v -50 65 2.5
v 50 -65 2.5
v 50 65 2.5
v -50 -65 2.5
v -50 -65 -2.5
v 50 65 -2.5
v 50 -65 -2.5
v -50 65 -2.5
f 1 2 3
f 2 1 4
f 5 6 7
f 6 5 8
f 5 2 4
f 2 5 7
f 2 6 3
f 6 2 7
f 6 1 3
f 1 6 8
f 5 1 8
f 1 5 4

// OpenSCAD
// Generated by SolidPython 1.1.3 on 2022-11-23 19:35:01


cube(center = true, size = [100, 130.0000000000, 5]);
/***********************************************
*********      SolidPython code:      **********
************************************************
 
import solid
import pudb
from solid.utils import *
import viewscad
import subprocess
import os
import os.path as osp
import math
r = viewscad.Renderer(width=800, height=800)
def debug(model,f_name,path="/home/ts/code/projects/mfd/designs/debug"):
    solid.scad_render_to_file(model,osp.join(path,f_name)+".scad")
#generate position list of wells using offset from center
wells_pos_from_center_4 = lambda offset: [[-offset,offset],
                                        [offset, offset],
                                        [-offset, -offset],
                                        [offset, -offset]]
#wells_pos_from_center_2 = lambda offset: [[0,offset],
#                                        [0, -offset]]
wells_pos_from_center_2 = lambda offset: [[offset,0],
                                        [-offset,0]]

def wells_top_bottom(radius,height=None, positions = None, dxf = False):
    if positions is None:
        offset = radius+radius/2.0
        positions = wells_pos_from_center_2(offset)
    if dxf or (height is None):
        height = 0
    wells = []
    for position in positions:
        #make circle if making dxf
        if dxf:
            well_shape = solid.circle(r=radius, segments=64)
            well_shape = solid.translate([position[0],position[1]])(well_shape)
        #if stl make cylinder
        else:
            well_shape = solid.cylinder(r=radius, h=height, segments=64, center = True)
            well_shape = solid.translate([position[0],position[1],height/2.0])(well_shape)
        wells.append(well_shape)
    return  union()(*wells)

#place wells in four corners 
def four_corner(radius,height=None, positions = None, dxf = False):
    #if well pos not specified set
    #to equally spaced by half radius
    if positions is None:
        offset = radius+radius/2.0
        positions = wells_pos_from_center_4(offset)
    if dxf or (height is None):
        height = 0
    #make wells at positions with specified radius and height
    wells = []
    for position in positions:
        #make circle if making dxf
        if dxf:
            well_shape = solid.circle(r=radius, segments=64)
            well_shape = solid.translate([position[0],position[1]])(well_shape)
        #if stl make cylinder
        else:
            well_shape = solid.cylinder(r=radius, h=height, segments=64, center = True)
            well_shape = solid.translate([position[0],position[1],height/2.0])(well_shape)
        wells.append(well_shape)
    return  union()(*wells)

#generate channels 
def make_channels(length,width,height=0,num_chans=1,max_chans=None,spacing=None, dxf = False,
                  rotate_channels=False):
    if dxf or (height is None):
        height = 0
    #if channel gap not defined, is equal to
    if spacing is None: spacing = width
    #calculate number of channels if fitting max num within given width
    if not max_chans is None:
        import math
        num_chans = math.floor((max_chans-spacing)/(width+spacing))
    #get total width of channel section  
    total_width = (width*num_chans)+(spacing*(num_chans-1))

    #make template channel
    #if rotate_channels: width, length = length, width
    if dxf:
        channel_t = solid.square([length,width],center = True)
    else:
        channel_t = solid.cube([length,width,height], center = True)

    #if number channels is even, offset the first channel to center its gap
    if num_chans % 2 == 0: centering = -(width/2.0+spacing/2.0)
    else: centering = 0
    #move template channel up to align bottom at z = 0 
    #and offset center if necessary
    if dxf:
        channel_t = solid.translate([0,centering])(channel_t)
    else:
        channel_t = solid.translate([0,centering,height/2.0])(channel_t)

    #if rotate_channels: length,width = width,length
    #start making the channels
    channels = []
    for i in range(num_chans):
        #if i=0 there is no translation
        #if i=1, we make the first channel adjacent to second
        direction = i

        #if i>=1, we add channels alternating left and right
        if i >= 1:
            direction = -(i/2.0)
            if i % 2 == 1: direction = (-direction)+0.5
                
        #make channel at right position and add it to channel list
        translation_coords = [0,direction*(width+spacing)]
        #if rotate_channels: translation_coords = [direction*(width+spacing),0]
        if dxf:
            channel = solid.translate(translation_coords)(channel_t)
        else:
            channel = solid.translate([*translation_coords,0])(channel_t)
        channels.append(channel)
    
    #group all channels as one object
    channels = union()(*channels)
    #compute the x,y,z dimensions in order to pass as arguments 
    #for construction of other parts of device (such as the chambers)
    measurements = {'x':(length/2.0,-length/2.0),
                    'y':(total_width/2.0,-total_width/2.0)}
    if not dxf:
        measurements['z'] = (height,0)
    if rotate_channels:
        channels = solid.rotate(90)(channels)
        measurements['x'],measurements['y']=measurements['y'],measurements['x']
    return channels,measurements

def make_chambers(msrs,height=None,extra=0,len_until=None,width=None, dxf = False):
    #computes x,y,z length
    total = lambda x : abs(x[0]) + abs(x[1])
    
    #if specific height if specified
    #otherwise use same height as channels
    if dxf:
        pass
    elif not height is None:
        msrs['z'] = (height,0)
    else:
        msrs['z'] = (0,0)
        
    #make copy of measurements from channels to modify chamber dimensions 
    #and add length to chambers as specified
    chamber_dims = msrs.copy()
    #calculate length of chamber to reach specified offset
    if not len_until is None:
        chamber_len = len_until-(msrs['x'][0])
    #or add specified length to channel length (if not specified, adds 0)
    else:
        chamber_len = msrs['x'][0]+extra
    #set the chamber length based 
    chamber_dims['x'] = (chamber_len/2.0,-(chamber_len/2.0))
    #compute final dimensions of chamber
    if not width is None:
        chamber_dims['y'] = (width/2.0,-width/2.0)
    chamber_dims = [total(size) for size in chamber_dims.values()]
        
    #calculate chamber translation offset to place adjacent to channels
    chamber_trslt = msrs['x'][0]+(chamber_len/2.0)
    #compute chamber translation coordinates to align with channels
    #x = 1 moves chamber above channels
    #x = -1 moves chamber below channels
    if dxf:
        trslt = lambda x : [x*(chamber_trslt),0]
    else:
        trslt = lambda x : [x*(chamber_trslt),0,msrs['z'][0]/2.0]
    
    #function to make chamber at top or at bottom 
    if dxf:
        move = lambda x : solid.translate(trslt(x))(solid.square(chamber_dims, center = True) )
    else:
        move = lambda x : solid.translate(trslt(x))(solid.cube(chamber_dims,center = True))
    #make top and bottom chambers and return them as grouped
    top = move(1)
    bottom = move(-1)
    #chambers=solid.rotate(90)(solid.union()(top,bottom))
    chambers=(solid.union()(top,bottom))

    return chambers

#create alignment features 
def alignment_features(unit,dims,grid_size, mask_size = None, alignment = "hollow", units_from_center = (2.5,2.5), corner_len=None):
    width = grid_size[0]*dims[0]
    length = grid_size[1]*dims[1]
    if mask_size is None and corner_len is None:
        corner_len = (dims[0] + dims[1]) /2 / 8
    corner = lambda thickness_div : solid.union()( solid.square([corner_len,corner_len/thickness_div],center=False), solid.square([corner_len/thickness_div,corner_len],center=False) )
    
    def make_full(thickness_div):
        thickness = corner_len/thickness_div
        tr = solid.translate([0, 0, 0 ])(solid.rotate(180)(corner(thickness_div)))
        tr = solid.translate([thickness/2,thickness/2,0])(tr)
        bl = solid.translate([0, 0, 0 ])(solid.rotate(0)(corner(thickness_div)))
        bl = solid.translate([-thickness/2,-thickness/2,0])(bl)
        return solid.union()(tr,bl)
    
    def make_hollow(thickness_div):
        thickness = corner_len/(thickness_div/2)
        inner = make_full(thickness_div)
        outer = make_full(thickness_div/2)
        hollow = outer - inner 
        return hollow
    
    center = (width /2 , length/2)
    mask_pos = lambda x,y : (center[0] + x*(float(units_from_center[0])*dims[0]), center[1] + y*(float(units_from_center[1])*dims[1]))
    positions = []
    positions.append(mask_pos(1,0))
    positions.append(mask_pos(0,1))
    positions.append(mask_pos(-1,0))
    positions.append(mask_pos(0,-1))
    make_mask = lambda mtype : make_hollow(8) if mtype == "hollow" else make_full(8)
    masks = [ solid.translate([*position,0])(make_mask(alignment)) for position in positions]
    
    solid.scad_render_to_file(solid.union()(*masks),"./designs/open_chamber/masks.scad")
    #return unit - solid.union()(*masks)
    return solid.union()(*masks,unit)

def create_outline(thickness, array, dims, grid_size,):
    width = grid_size[0]*dims[0] + thickness *2
    length = grid_size[1]*dims[1] + thickness *2
    outer = solid.translate([-thickness, -thickness,0])(solid.square([width, length]))
    return outer-array

def create_wall(wall_thickness, outline_thickness, dims, grid_size, wall_height = 2000, dxf = False):
    inner_width = grid_size[0]*dims[0] + outline_thickness *2
    inner_length = grid_size[1]*dims[1] + outline_thickness *2
    outer_width = inner_width + wall_thickness * 2
    outer_length = inner_length + wall_thickness * 2
    outer_pos_x = -outline_thickness-wall_thickness
    outer_pos_y = -outline_thickness-wall_thickness
    inner_pos_x = -outline_thickness
    inner_pos_y = -outline_thickness
    if dxf:
        inner_wall = solid.translate([inner_pos_x,
                                      inner_pos_y,
                                      0])(solid.square([inner_width, inner_length]))
        outer_wall = solid.translate([outer_pos_x,
                                      outer_pos_y,
                                      0])(solid.square([outer_width, outer_length]))

        return outer_wall-inner_wall
    else:
        inner_wall = solid.translate([inner_pos_x,
                                      inner_pos_y,
                                      0])(solid.cube([inner_width, inner_length,wall_height]))
        outer_wall = solid.translate([outer_pos_x,
                                      outer_pos_y,
                                      0])(solid.cube([outer_width, outer_length,wall_height]))

        return outer_wall-inner_wall, {'wall_height': wall_height,
                                       'wall_thickness': wall_thickness,
                                       'inner_width':inner_width,
                                       'inner_length': inner_length,
                                       'outer_width': outer_width,
                                       'outer_length': outer_length,
                                       'outer_pos_x' : outer_pos_x,
                                       'outer_pos_y' : outer_pos_y,
                                       'inner_pos_x' : inner_pos_x,
                                       'inner_pos_y' : inner_pos_y}

def create_thicker_wall(wall_thickness, outer_wall_offset, wall_dims, dims, grid_size, height_start = .2, height_end=2, dxf = False):
    addon_wall,thicker_wall_dims = create_wall(wall_thickness, outer_wall_offset, dims, grid_size, wall_height=height_end-height_start, dxf = False)
    addon_wall = solid.translate([0,0,height_start])(addon_wall)

    thicker_wall_dims['wall_height'] = height_end
    thicker_wall_dims['wall_thickness'] = wall_dims['wall_thickness'] + wall_thickness
    return addon_wall, thicker_wall_dims
 
def add_lock_to_wall(wall,wall_dims,y_offset = 0,cut_ratio=0.7,L_length=3, gap_ratio=0.05, axis="x",width_ratio=1/2):
    # Makes L shape
    def make_L(max_length,length_thickness,max_width,width_thickness,height,y_offset):
        length = solid.cube([max_length,length_thickness,height])
        width = solid.cube([width_thickness,max_width,height])
        width = solid.translate([max_length-(width_thickness),0,0])(width)
        L = solid.union()(width,length)
        debug(L,"L")
        if axis == "x":
            L = solid.rotate(-90)(L)
            L = solid.translate([0,max_length,0])(L)
        else:
            L = solid.rotate(-180)(L)
            L = solid.translate([max_length,max_width,0])(L)
        return solid.translate([0,0,y_offset])(L)
    
    lock_length = L_length
    lock_width = wall_dims['wall_thickness']*width_ratio
    lock_length_thickness = lock_width/2
    lock_width_thickness = lock_width/2
    L_lock = make_L(lock_length,lock_length_thickness,lock_width,lock_width_thickness, wall_dims['wall_height']-y_offset, y_offset)
    
    margin_space = lock_length - lock_length*(1-gap_ratio)
    key_length = lock_length-margin_space
    key_length_thickness = lock_length_thickness-(margin_space*2)
    key_width = lock_width-(margin_space*2)
    key_width_thickness = lock_width_thickness-(margin_space*2)
    L_key = make_L(key_length,key_length_thickness,key_width,key_width_thickness, wall_dims['wall_height']-y_offset, y_offset)
    L_key = solid.translate([margin_space,margin_space,0])(L_key)
    L = solid.union()(L_lock,L_key)
    debug(L,"L")
    
    #Make cube to be used as negative to split frame in a half
    #Can choose if making left or right negative, specify ratio of split
    def make_negative(right,cut_ratio):
        if axis == "x":
            if right:
                length = wall_dims['outer_length']*(1-cut_ratio)
                pos_x = wall_dims['outer_pos_x']+(wall_dims['outer_length']*cut_ratio)
            else:
                length = wall_dims['outer_length']*(cut_ratio)
                pos_x = wall_dims['outer_pos_x'] 
            negative = solid.cube([wall_dims['outer_width'],length, wall_dims['wall_height']])
            negative = solid.translate([wall_dims['outer_pos_y'],pos_x,0])(negative)
        else:
            if right:
                length = wall_dims['outer_width']*(1-cut_ratio)
                pos_x = wall_dims['outer_pos_y']+(wall_dims['outer_width']*cut_ratio)
            else:
                length = wall_dims['outer_width']*(cut_ratio)
                pos_x = wall_dims['outer_pos_y'] 
            negative = solid.cube([length,wall_dims['outer_length'], wall_dims['wall_height']])
            negative = solid.translate([pos_x,wall_dims['outer_pos_x'],0])(negative)
        return negative, pos_x, length 
                      
    #Make negatives
    negative_right, right_half_pos_x, right_half_length = make_negative(True,cut_ratio)
    negative_left, left_half_pos_x, right_half_length = make_negative(False,cut_ratio)
    #Make halves
    left_half = solid.difference()(wall,negative_right)
    right_half = solid.difference()(wall,negative_left)
    def place_L(L, L_length,L_width):
        #Place L on top wall       
        offset_to_center = (wall_dims['wall_thickness']-L_width)/2
        if axis == "x":
            y_pos_top = (wall_dims['outer_pos_y'] +
                    wall_dims['outer_width'] - 
                    L_width - offset_to_center)
            top_L = solid.translate([y_pos_top,
                                     right_half_pos_x-(L_length),
                                     0])(L)
            #Place L on bottom wall       
            y_pos_bottom = wall_dims['outer_pos_y']+offset_to_center
            bottom_L = solid.translate([y_pos_bottom,
                                        right_half_pos_x-L_length,
                                        0])(L)
        else:
            y_pos_top = (wall_dims['outer_pos_x'] +
                    wall_dims['outer_length'] -
                    (L_width+offset_to_center))
            top_L = solid.translate([right_half_pos_x-L_length,
                                     y_pos_top,
                                     0])(L)
            #Place L on bottom wall       
            y_pos_bottom = wall_dims['outer_pos_y']+offset_to_center
            bottom_L = solid.translate([right_half_pos_x-L_length,
                                        y_pos_bottom,
                                        0])(L)
        return bottom_L, top_L
    #Make complimentary L pieces through union and differences
    #Make Lock
    bottom_L_lock, top_L_lock = place_L(L_lock,L_length,lock_width)
    left_half = solid.difference()(left_half,bottom_L_lock)
    left_half = solid.difference()(left_half,top_L_lock)
    #Make Key
    bottom_L_key, top_L_key = place_L(L_key,L_length,lock_width)
    right_half = solid.union()(right_half,bottom_L_key)
    right_half = solid.union()(right_half,top_L_key)
    return left_half, right_half


#build a row x col grid of containment units
def make_unit_array(unit,dims,grid_size, dxf = False, alignment = None, mask_size = None,
                    units_from_center = None,alignment_offset=None, alignment_mark_size=1):
    units = []
    for col in range(grid_size[1]):
        for row in range(grid_size[0]):
            if dxf:
                units.append(solid.translate([row*dims[0],col*dims[1]])(unit))
            else:
                units.append(solid.translate([row*dims[0],col*dims[1],dims[2]/2.0])(unit))
    array = solid.union()(*units)
    if (not alignment is None) and dxf:
        if not alignment_offset is None:
            array = solid.translate([alignment_offset[0],alignment_offset[1]])(array)
        array = alignment_features(array,dims, grid_size, alignment = alignment, mask_size = None, units_from_center = units_from_center,corner_len=alignment_mark_size)
        if not alignment_offset is None:
            array = solid.translate([-alignment_offset[0],-alignment_offset[1]])(array)
    return array


def make_taylor(wells_pos = wells_pos_from_center_4(2.25), well_rad = 1.5 ,
                well_height = 2, chan_w = 0.01, chan_l = 1, chan_h = 0.010 ,
                chan_gap = 0.040, max_chans = None,num_chans=100, chamber_height  = 0.100,
                columns = 1, rows = 1, chamber_len_until=2.25, add_channels = True, add_wells = True, 
                add_chambers = True, save_path = "./", alignment = None, units_from_center = 2,
                mask_size = None, render_stl = False, outline_thickness = 0.050, dxf = True,
                wall_height = 15, wall_thickness = 0.95, casing_x=9, casing_y=9, casing_z=0,rotate_units=0):

    dims = [casing_x, casing_y, casing_z]
    wells = four_corner(well_rad,well_height, dxf = dxf, positions = wells_pos)
    debug(wells,"wells")
    channels, msrs = make_channels(chan_l,chan_w,chan_h,dxf=dxf, spacing = chan_gap, max_chans=max_chans,num_chans=num_chans)
    debug(channels,"channels")
    chambers = make_chambers(msrs,dxf = dxf, height=chamber_height,len_until=chamber_len_until)
    debug(chambers,"chambers")

    #add together and render
    device_parts = []
    if add_channels:
        device_parts.append(channels)
    if add_wells:
        device_parts.append(wells)
    if add_chambers:
        device_parts.append(chambers)
    device=union()(*device_parts)
    device = rotate(rotate_units)(device)

    device=solid.translate([dims[0]/2.0,dims[1]/2.0,0])(device)
    channels = rotate(rotate_units)(channels)
    channels=solid.translate([dims[0]/2,dims[1]/2,0])(channels)
    chambers_wells = union()(wells,chambers)
    chambers_wells = rotate(rotate_units)(chambers_wells)
    chambers_wells=solid.translate([dims[0]/2,dims[1]/2,0])(chambers_wells)

    file_name = str(rows)+'x'+str(columns)+'_units_'
    grid_size = [rows,columns]

    if alignment:
        alignment="full"
    device = make_unit_array(device,dims,grid_size, dxf=dxf, alignment = alignment,
                                 units_from_center = units_from_center)
    channels = make_unit_array(channels,dims,grid_size, dxf=dxf, alignment = alignment,
                                 units_from_center = units_from_center)
    if alignment=="full":
        alignment="hollow"

    chambers_wells = make_unit_array(chambers_wells,dims,grid_size, dxf=dxf, alignment = alignment,
                                 units_from_center =units_from_center)

    def save_model(model,prefix):
        model_fname = os.path.abspath(save_path+prefix+"_"+file_name+".scad")
        solid.scad_render_to_file(model,model_fname)
        return model_fname

    wells_fname = save_model(wells,"wells")
    channels_fname = save_model(channels,"channels")
    device_fname = save_model(device,"device")
    chambers_wells_fname = save_model(chambers_wells,"chambers_wells")
    return (chambers_wells,chambers_wells_fname), (channels,channels_fname), (device,device_fname)

def make_device(design='open',rows=8,columns=6,wells_pos = 4.5, well_rad=3.2,well_height=0.1,
                chan_l=1,chan_w=0.01,chan_h=0.01,chan_gap=0.015,num_chans=101,dxf=True,save_path="./designs/open_chamber/",
                casing_x=9.0,casing_y=18.0,casing_z=0,rotate_units=90,units_from_center=(3,1),chamber_len_until=4.5,
                chamber_width=None,alignment=True, add_wells=True, add_channels=True,add_chambers=True):

    dims = [casing_x, casing_y, casing_z]
    if design == "open":
        wells_pos=wells_pos_from_center_2(wells_pos)
        wells = wells_top_bottom(well_rad,height=well_height, dxf = dxf, positions = wells_pos)
    elif design == "closed":
        wells_pos=wells_pos_from_center_4(wells_pos)
        wells = four_corner(well_rad,well_height, dxf = dxf, positions = wells_pos)
    else:
        print(design+" is not a valid design.\n Choose valid design: 'open' or 'closed'")
        exit()
    wells = rotate(rotate_units)(wells)
    wells=solid.translate([dims[0]/2,dims[1]/2,0])(wells)



    channels, msrs = make_channels(chan_l,chan_w,chan_h,dxf=dxf, spacing = chan_gap, num_chans=num_chans,rotate_channels=False)
    channels = rotate(rotate_units)(channels)
    channels=solid.translate([dims[0]/2,dims[1]/2,0])(channels)

    chambers=make_chambers(msrs,height=None,extra=0,len_until=chamber_len_until, width=chamber_width,dxf = dxf)
    chambers = rotate(rotate_units)(chambers)
    chambers=solid.translate([dims[0]/2,dims[1]/2,0])(chambers)

    device_parts = []
    if add_channels:
        device_parts.append(channels)
    if add_wells:
        device_parts.append(wells)
    if add_chambers:
        device_parts.append(chambers)
    device = union()(*device_parts)
    #device = rotate(rotate_units)(device)
    #device=solid.translate([dims[0]/2.0,dims[1]/2.0,0])(device)

    chambers_wells = []
    if add_chambers:
        chambers_wells.append(chambers)
    if add_wells:
        chambers_wells.append(wells)
    chambers_wells = union()(*chambers_wells)
    #chambers_wells = union()(wells,chambers)
    #chambers_wells = rotate(rotate_units)(chambers_wells)
    #chambers_wells=solid.translate([dims[0]/2,dims[1]/2,0])(chambers_wells)

    file_name = str(rows)+'x'+str(columns)+'_units_'

    grid_size = [rows,columns]
    if alignment:
        alignment="full"
    device = make_unit_array(device,dims,grid_size, dxf=dxf, alignment = alignment,
                                 units_from_center = units_from_center)
    channels = make_unit_array(channels,dims,grid_size, dxf=dxf, alignment = alignment,
                                 units_from_center = units_from_center)
    if alignment=="full":
        alignment="hollow"

    chambers_wells = make_unit_array(chambers_wells,dims,grid_size, dxf=dxf, alignment = alignment,
                                 units_from_center =units_from_center)

    def save_model(model,prefix):
        model_fname = os.path.abspath(save_path+prefix+"_"+file_name+".scad")
        solid.scad_render_to_file(model,model_fname)
        return model_fname

    wells_fname = save_model(wells,"wells")
    channels_fname = save_model(channels,"channels")
    device_fname = save_model(device,"device")
    chambers_wells_fname = save_model(chambers_wells,"chambers_wells")
    return (chambers_wells,chambers_wells_fname), (channels,channels_fname), (device,device_fname)


def make_open_chamber(rows=8,columns=6,wells_pos = wells_pos_from_center_2(4.5), well_rad=3.2,well_height=0.1,
                      chan_l=1,chan_w=0.01,chan_h=0.01,chan_gap=0.015,num_chans=101,dxf=True,save_path="./designs/open_chamber/",
                      casing_x=9.0,casing_y=18.0,casing_z=0,rotate_units=90,units_from_center=(3,1),chamber_len_until=4.5,
                      chamber_width=None,alignment=True, add_wells=True, add_channels=True,add_chambers=True):

    dims = [casing_x, casing_y, casing_z]
    wells = wells_top_bottom(well_rad,height=well_height, dxf = dxf, positions = wells_pos)
    channels, msrs = make_channels(chan_l,chan_w,chan_h,dxf=dxf, spacing = chan_gap, num_chans=num_chans,rotate_channels=False)
    chambers=make_chambers(msrs,height=None,extra=0,len_until=chamber_len_until, width=chamber_width,dxf = dxf)
    debug(chambers,"chambers")
    device_parts = []
    if add_channels:
        device_parts.append(channels)
    if add_wells:
        device_parts.append(wells)
    if add_chambers:
        device_parts.append(chambers)
    device = union()(*device_parts)
    device = rotate(rotate_units)(device)
    device=solid.translate([dims[0]/2.0,dims[1]/2.0,0])(device)
    channels = rotate(rotate_units)(channels)
    channels=solid.translate([dims[0]/2,dims[1]/2,0])(channels)
    chambers_wells = union()(wells,chambers)
    chambers_wells = rotate(rotate_units)(chambers_wells)
    chambers_wells=solid.translate([dims[0]/2,dims[1]/2,0])(chambers_wells)

    file_name = str(rows)+'x'+str(columns)+'_units_'

    grid_size = [rows,columns]
    if alignment:
        alignment="full"
    device = make_unit_array(device,dims,grid_size, dxf=dxf, alignment = alignment,
                                 units_from_center = units_from_center)
    channels = make_unit_array(channels,dims,grid_size, dxf=dxf, alignment = alignment,
                                 units_from_center = units_from_center)
    if alignment=="full":
        alignment="hollow"

    chambers_wells = make_unit_array(chambers_wells,dims,grid_size, dxf=dxf, alignment = alignment,
                                 units_from_center =units_from_center)

    def save_model(model,prefix):
        model_fname = os.path.abspath(save_path+prefix+"_"+file_name+".scad")
        solid.scad_render_to_file(model,model_fname)
        return model_fname

    wells_fname = save_model(wells,"wells")
    channels_fname = save_model(channels,"channels")
    device_fname = save_model(device,"device")
    chambers_wells_fname = save_model(chambers_wells,"chambers_wells")
    return (chambers_wells,chambers_wells_fname), (channels,channels_fname), (device,device_fname)

def to_dxf(scad_path):
    dxf_path = scad_path.replace(".scad",".dxf")
    subprocess.call(["openscad", "-o", dxf_path, scad_path])
    import ezdxf
    temp_dxf = ezdxf.readfile(dxf_path)
    temp_dxf.saveas(dxf_path)

#def make_walls(diameter,thickness,grid_size,dims,height=20,segments=256,make_inner=True):
#    wafer_wall_out = solid.cylinder(r=diameter/2,h=height, segments=segments)
#    wafer_wall_in = solid.cylinder(r=(diameter/2-thickness),h=height, segments=segments)
#    wafer_wall = solid.difference()(wafer_wall_out,wafer_wall_in)
#    wafer_wall = solid.translate([grid_size[1]*dims[1]/2.0,grid_size[0]*dims[0]/2.0])(wafer_wall)
#
#    vertical_wall_length = grid_size[1]*dims[1]
#    horizontal_wall_length = grid_size[0]*dims[0]
#    vertical_wall = solid.cube([vertical_wall_length,thickness,height],center = True)
#    vertical_wall = solid.translate([vertical_wall_length/2,0,height/2])(vertical_wall)
#    horizontal_wall = solid.cube([thickness,horizontal_wall_length,height],center = True)
#    horizontal_wall = solid.translate([0,vertical_wall_length/2,height/2])(horizontal_wall)
#    walls = []
#    walls.append(horizontal_wall)
#    walls.append(vertical_wall)
#    for col in range(grid_size[1]):
#        if col == grid_size[1]-1: 
#            walls.append(solid.translate([0,(col+1)*dims[1]])(vertical_wall))
#        elif col > 0 and col < grid_size[1]-1 and make_inner==True:
#            walls.append(solid.translate([0,(col+1)*dims[1]])(vertical_wall))
#    for row in range(grid_size[0]):
#        if row == grid_size[0]-1: 
#            walls.append(solid.translate([(row+1)*dims[0],0])(horizontal_wall))
#        elif row > 0 and row < grid_size[0]-1 and make_inner==True:
#            walls.append(solid.translate([(row+1)*dims[0],0])(horizontal_wall))
#    walls = union()(*walls)
#    wafer_walls = union()(walls,wafer_wall)
#    return walls,wafer_wall,wafer_walls

def make_walls(diameter,thickness,grid_size,dims,height=20,segments=256,make_inner=True,padx=0,pady=0):
    wafer_wall_out = solid.cylinder(r=diameter/2,h=height, segments=segments)
    wafer_wall_in = solid.cylinder(r=(diameter/2-thickness),h=height, segments=segments)
    wafer_wall = solid.difference()(wafer_wall_out,wafer_wall_in)
    wafer_wall = solid.translate([grid_size[1]*dims[1]/2.0,grid_size[0]*dims[0]/2.0])(wafer_wall)

    vertical_wall_length = grid_size[0]*dims[0]+padx
    horizontal_wall_length = grid_size[1]*dims[1]+pady
    vertical_wall = solid.cube([vertical_wall_length,thickness,height],center = True)
    vertical_wall = solid.translate([vertical_wall_length/2-pady/2,-padx/2,height/2])(vertical_wall)
    horizontal_wall = solid.cube([thickness,horizontal_wall_length,height],center = True)
    horizontal_wall = solid.translate([-pady/2,horizontal_wall_length/2-padx/2,height/2])(horizontal_wall)
    walls = []
    walls.append(horizontal_wall)
    walls.append(vertical_wall)
    for col in range(grid_size[1]):
        if col == grid_size[1]-1: 
            walls.append(solid.translate([0,(col+1)*dims[1]+pady])(vertical_wall))
        elif col > 0 and col < grid_size[1]-1 and make_inner==True:
            walls.append(solid.translate([0,(col+1)*dims[1]])(vertical_wall))
    for row in range(grid_size[0]):
        if row == grid_size[0]-1: 
            walls.append(solid.translate([(row+1)*dims[0]+padx,0])(horizontal_wall))
        elif row > 0 and row < grid_size[0]-1 and make_inner==True:
            walls.append(solid.translate([(row+1)*dims[0],0])(horizontal_wall))
    walls = union()(*walls)
    wafer_walls = union()(walls,wafer_wall)
    return walls,wafer_wall,wafer_walls

def save_model(model,base_path,base_name,dxf=True):
    if not os.path.exists(base_path):
        os.makedirs(base_path)
    dxf_path=osp.join(base_path,base_name+".scad")
    solid.scad_render_to_file(model,osp.join(dxf_path))
    if dxf:
        to_dxf(dxf_path)

def make_wafer(diameter,flat_len,thickness):
    wafer = solid.cylinder(r1=diameter/2,r2=diameter/2,h=thickness,segments=512,)()
    x_start_flat=(flat_len/2)
    y_start_flat = math.sqrt(((diameter/2)**2) - (x_start_flat**2) )
    height_delete_flat=diameter/2-y_start_flat
    flat_delete = solid.cube([flat_len,height_delete_flat,thickness],center=False)()
    flat_delete = solid.translate([-flat_len/2,y_start_flat,0])(flat_delete)
    wafer = solid.difference()(wafer,flat_delete)
    wafer = solid.rotate(90)(wafer)
    return wafer

def add_wafer_to_mask(wafer_size,flat_len,mask,grid_size,dims,wafer_line_thickness=0.1,outer_mask_thickness=5,alignment_offset=None):
    def make_wafer_mask(wafer_size,flat_len):
        wafer_mask = make_wafer(wafer_size,flat_len,1)
        wafer_mask = solid.projection()(wafer_mask)
        wafer_mask = solid.translate([grid_size[0]*dims[0]/2.0,grid_size[1]*dims[1]/2.0])(wafer_mask)
        if not alignment_offset is None:
            wafer_mask = solid.translate([-alignment_offset[0],-alignment_offset[1]])(wafer_mask)
        return wafer_mask

    inner_wafer_line_mask = make_wafer_mask(wafer_size-wafer_line_thickness/2,flat_len)
    outer_wafer_line_mask = make_wafer_mask(wafer_size+wafer_line_thickness/2,flat_len)
    outer_wafer_mask = make_wafer_mask(wafer_size+outer_mask_thickness,flat_len)
    outer_wafer_mask = solid.difference()(outer_wafer_mask,outer_wafer_line_mask)
    wafer_mask = solid.union()(outer_wafer_mask,inner_wafer_line_mask)

    return solid.difference()(wafer_mask,mask)

def make_posts(post_shape,post_height):
    posts = solid.linear_extrude(height=post_height)(post_shape)
    return posts

def make_wafer_empty(diameter,flat_len,thickness,margin,notch_len=20,notch_height=5,oversize=1.01):
    diameter*=oversize
    flat_len*=oversize
    wafer = make_wafer(diameter,flat_len,thickness)
    holder = solid.cylinder(r1=diameter/2+margin,r2=diameter/2+margin,h=thickness,segments=512)()
    holder = solid.difference()(holder,wafer)

    x_start_flat=(flat_len/2)
    y_start_flat = math.sqrt(((diameter/2)**2) - (x_start_flat**2) )
    height_delete_flat=diameter/2-y_start_flat
    notch = solid.cube([notch_len,notch_height,thickness],center=False)()
    notch = solid.translate([-notch_len/2,y_start_flat,0])(notch)
    notch = solid.rotate(90)(notch)
    return solid.difference()(holder,notch)

def wafer_print_calibration(diameter,thickness,height,z_offset):
    circles = []
    radii = []
    radii.append(diameter/2.0*0.8)
    radii.append(diameter/2.0*0.6)
    radii.append(diameter/2.0*0.4)
    radii.append(diameter/2.0*0.2)
    for radius in radii:
        inner = solid.cylinder(r1=radius-(thickness/2.0),r2=radius-(thickness/2.0),h=thickness,segments=512,)()
        outer = solid.cylinder(r1=radius+(thickness/2.0),r2=radius+(thickness/2.0),h=thickness,segments=512,)()
        diff = solid.difference()(outer,inner)
        circles.append(diff)
    circles = solid.union()(*circles)
    circles = solid.translate([0,0,z_offset])(circles)
    return circles






 
 
************************************************/
